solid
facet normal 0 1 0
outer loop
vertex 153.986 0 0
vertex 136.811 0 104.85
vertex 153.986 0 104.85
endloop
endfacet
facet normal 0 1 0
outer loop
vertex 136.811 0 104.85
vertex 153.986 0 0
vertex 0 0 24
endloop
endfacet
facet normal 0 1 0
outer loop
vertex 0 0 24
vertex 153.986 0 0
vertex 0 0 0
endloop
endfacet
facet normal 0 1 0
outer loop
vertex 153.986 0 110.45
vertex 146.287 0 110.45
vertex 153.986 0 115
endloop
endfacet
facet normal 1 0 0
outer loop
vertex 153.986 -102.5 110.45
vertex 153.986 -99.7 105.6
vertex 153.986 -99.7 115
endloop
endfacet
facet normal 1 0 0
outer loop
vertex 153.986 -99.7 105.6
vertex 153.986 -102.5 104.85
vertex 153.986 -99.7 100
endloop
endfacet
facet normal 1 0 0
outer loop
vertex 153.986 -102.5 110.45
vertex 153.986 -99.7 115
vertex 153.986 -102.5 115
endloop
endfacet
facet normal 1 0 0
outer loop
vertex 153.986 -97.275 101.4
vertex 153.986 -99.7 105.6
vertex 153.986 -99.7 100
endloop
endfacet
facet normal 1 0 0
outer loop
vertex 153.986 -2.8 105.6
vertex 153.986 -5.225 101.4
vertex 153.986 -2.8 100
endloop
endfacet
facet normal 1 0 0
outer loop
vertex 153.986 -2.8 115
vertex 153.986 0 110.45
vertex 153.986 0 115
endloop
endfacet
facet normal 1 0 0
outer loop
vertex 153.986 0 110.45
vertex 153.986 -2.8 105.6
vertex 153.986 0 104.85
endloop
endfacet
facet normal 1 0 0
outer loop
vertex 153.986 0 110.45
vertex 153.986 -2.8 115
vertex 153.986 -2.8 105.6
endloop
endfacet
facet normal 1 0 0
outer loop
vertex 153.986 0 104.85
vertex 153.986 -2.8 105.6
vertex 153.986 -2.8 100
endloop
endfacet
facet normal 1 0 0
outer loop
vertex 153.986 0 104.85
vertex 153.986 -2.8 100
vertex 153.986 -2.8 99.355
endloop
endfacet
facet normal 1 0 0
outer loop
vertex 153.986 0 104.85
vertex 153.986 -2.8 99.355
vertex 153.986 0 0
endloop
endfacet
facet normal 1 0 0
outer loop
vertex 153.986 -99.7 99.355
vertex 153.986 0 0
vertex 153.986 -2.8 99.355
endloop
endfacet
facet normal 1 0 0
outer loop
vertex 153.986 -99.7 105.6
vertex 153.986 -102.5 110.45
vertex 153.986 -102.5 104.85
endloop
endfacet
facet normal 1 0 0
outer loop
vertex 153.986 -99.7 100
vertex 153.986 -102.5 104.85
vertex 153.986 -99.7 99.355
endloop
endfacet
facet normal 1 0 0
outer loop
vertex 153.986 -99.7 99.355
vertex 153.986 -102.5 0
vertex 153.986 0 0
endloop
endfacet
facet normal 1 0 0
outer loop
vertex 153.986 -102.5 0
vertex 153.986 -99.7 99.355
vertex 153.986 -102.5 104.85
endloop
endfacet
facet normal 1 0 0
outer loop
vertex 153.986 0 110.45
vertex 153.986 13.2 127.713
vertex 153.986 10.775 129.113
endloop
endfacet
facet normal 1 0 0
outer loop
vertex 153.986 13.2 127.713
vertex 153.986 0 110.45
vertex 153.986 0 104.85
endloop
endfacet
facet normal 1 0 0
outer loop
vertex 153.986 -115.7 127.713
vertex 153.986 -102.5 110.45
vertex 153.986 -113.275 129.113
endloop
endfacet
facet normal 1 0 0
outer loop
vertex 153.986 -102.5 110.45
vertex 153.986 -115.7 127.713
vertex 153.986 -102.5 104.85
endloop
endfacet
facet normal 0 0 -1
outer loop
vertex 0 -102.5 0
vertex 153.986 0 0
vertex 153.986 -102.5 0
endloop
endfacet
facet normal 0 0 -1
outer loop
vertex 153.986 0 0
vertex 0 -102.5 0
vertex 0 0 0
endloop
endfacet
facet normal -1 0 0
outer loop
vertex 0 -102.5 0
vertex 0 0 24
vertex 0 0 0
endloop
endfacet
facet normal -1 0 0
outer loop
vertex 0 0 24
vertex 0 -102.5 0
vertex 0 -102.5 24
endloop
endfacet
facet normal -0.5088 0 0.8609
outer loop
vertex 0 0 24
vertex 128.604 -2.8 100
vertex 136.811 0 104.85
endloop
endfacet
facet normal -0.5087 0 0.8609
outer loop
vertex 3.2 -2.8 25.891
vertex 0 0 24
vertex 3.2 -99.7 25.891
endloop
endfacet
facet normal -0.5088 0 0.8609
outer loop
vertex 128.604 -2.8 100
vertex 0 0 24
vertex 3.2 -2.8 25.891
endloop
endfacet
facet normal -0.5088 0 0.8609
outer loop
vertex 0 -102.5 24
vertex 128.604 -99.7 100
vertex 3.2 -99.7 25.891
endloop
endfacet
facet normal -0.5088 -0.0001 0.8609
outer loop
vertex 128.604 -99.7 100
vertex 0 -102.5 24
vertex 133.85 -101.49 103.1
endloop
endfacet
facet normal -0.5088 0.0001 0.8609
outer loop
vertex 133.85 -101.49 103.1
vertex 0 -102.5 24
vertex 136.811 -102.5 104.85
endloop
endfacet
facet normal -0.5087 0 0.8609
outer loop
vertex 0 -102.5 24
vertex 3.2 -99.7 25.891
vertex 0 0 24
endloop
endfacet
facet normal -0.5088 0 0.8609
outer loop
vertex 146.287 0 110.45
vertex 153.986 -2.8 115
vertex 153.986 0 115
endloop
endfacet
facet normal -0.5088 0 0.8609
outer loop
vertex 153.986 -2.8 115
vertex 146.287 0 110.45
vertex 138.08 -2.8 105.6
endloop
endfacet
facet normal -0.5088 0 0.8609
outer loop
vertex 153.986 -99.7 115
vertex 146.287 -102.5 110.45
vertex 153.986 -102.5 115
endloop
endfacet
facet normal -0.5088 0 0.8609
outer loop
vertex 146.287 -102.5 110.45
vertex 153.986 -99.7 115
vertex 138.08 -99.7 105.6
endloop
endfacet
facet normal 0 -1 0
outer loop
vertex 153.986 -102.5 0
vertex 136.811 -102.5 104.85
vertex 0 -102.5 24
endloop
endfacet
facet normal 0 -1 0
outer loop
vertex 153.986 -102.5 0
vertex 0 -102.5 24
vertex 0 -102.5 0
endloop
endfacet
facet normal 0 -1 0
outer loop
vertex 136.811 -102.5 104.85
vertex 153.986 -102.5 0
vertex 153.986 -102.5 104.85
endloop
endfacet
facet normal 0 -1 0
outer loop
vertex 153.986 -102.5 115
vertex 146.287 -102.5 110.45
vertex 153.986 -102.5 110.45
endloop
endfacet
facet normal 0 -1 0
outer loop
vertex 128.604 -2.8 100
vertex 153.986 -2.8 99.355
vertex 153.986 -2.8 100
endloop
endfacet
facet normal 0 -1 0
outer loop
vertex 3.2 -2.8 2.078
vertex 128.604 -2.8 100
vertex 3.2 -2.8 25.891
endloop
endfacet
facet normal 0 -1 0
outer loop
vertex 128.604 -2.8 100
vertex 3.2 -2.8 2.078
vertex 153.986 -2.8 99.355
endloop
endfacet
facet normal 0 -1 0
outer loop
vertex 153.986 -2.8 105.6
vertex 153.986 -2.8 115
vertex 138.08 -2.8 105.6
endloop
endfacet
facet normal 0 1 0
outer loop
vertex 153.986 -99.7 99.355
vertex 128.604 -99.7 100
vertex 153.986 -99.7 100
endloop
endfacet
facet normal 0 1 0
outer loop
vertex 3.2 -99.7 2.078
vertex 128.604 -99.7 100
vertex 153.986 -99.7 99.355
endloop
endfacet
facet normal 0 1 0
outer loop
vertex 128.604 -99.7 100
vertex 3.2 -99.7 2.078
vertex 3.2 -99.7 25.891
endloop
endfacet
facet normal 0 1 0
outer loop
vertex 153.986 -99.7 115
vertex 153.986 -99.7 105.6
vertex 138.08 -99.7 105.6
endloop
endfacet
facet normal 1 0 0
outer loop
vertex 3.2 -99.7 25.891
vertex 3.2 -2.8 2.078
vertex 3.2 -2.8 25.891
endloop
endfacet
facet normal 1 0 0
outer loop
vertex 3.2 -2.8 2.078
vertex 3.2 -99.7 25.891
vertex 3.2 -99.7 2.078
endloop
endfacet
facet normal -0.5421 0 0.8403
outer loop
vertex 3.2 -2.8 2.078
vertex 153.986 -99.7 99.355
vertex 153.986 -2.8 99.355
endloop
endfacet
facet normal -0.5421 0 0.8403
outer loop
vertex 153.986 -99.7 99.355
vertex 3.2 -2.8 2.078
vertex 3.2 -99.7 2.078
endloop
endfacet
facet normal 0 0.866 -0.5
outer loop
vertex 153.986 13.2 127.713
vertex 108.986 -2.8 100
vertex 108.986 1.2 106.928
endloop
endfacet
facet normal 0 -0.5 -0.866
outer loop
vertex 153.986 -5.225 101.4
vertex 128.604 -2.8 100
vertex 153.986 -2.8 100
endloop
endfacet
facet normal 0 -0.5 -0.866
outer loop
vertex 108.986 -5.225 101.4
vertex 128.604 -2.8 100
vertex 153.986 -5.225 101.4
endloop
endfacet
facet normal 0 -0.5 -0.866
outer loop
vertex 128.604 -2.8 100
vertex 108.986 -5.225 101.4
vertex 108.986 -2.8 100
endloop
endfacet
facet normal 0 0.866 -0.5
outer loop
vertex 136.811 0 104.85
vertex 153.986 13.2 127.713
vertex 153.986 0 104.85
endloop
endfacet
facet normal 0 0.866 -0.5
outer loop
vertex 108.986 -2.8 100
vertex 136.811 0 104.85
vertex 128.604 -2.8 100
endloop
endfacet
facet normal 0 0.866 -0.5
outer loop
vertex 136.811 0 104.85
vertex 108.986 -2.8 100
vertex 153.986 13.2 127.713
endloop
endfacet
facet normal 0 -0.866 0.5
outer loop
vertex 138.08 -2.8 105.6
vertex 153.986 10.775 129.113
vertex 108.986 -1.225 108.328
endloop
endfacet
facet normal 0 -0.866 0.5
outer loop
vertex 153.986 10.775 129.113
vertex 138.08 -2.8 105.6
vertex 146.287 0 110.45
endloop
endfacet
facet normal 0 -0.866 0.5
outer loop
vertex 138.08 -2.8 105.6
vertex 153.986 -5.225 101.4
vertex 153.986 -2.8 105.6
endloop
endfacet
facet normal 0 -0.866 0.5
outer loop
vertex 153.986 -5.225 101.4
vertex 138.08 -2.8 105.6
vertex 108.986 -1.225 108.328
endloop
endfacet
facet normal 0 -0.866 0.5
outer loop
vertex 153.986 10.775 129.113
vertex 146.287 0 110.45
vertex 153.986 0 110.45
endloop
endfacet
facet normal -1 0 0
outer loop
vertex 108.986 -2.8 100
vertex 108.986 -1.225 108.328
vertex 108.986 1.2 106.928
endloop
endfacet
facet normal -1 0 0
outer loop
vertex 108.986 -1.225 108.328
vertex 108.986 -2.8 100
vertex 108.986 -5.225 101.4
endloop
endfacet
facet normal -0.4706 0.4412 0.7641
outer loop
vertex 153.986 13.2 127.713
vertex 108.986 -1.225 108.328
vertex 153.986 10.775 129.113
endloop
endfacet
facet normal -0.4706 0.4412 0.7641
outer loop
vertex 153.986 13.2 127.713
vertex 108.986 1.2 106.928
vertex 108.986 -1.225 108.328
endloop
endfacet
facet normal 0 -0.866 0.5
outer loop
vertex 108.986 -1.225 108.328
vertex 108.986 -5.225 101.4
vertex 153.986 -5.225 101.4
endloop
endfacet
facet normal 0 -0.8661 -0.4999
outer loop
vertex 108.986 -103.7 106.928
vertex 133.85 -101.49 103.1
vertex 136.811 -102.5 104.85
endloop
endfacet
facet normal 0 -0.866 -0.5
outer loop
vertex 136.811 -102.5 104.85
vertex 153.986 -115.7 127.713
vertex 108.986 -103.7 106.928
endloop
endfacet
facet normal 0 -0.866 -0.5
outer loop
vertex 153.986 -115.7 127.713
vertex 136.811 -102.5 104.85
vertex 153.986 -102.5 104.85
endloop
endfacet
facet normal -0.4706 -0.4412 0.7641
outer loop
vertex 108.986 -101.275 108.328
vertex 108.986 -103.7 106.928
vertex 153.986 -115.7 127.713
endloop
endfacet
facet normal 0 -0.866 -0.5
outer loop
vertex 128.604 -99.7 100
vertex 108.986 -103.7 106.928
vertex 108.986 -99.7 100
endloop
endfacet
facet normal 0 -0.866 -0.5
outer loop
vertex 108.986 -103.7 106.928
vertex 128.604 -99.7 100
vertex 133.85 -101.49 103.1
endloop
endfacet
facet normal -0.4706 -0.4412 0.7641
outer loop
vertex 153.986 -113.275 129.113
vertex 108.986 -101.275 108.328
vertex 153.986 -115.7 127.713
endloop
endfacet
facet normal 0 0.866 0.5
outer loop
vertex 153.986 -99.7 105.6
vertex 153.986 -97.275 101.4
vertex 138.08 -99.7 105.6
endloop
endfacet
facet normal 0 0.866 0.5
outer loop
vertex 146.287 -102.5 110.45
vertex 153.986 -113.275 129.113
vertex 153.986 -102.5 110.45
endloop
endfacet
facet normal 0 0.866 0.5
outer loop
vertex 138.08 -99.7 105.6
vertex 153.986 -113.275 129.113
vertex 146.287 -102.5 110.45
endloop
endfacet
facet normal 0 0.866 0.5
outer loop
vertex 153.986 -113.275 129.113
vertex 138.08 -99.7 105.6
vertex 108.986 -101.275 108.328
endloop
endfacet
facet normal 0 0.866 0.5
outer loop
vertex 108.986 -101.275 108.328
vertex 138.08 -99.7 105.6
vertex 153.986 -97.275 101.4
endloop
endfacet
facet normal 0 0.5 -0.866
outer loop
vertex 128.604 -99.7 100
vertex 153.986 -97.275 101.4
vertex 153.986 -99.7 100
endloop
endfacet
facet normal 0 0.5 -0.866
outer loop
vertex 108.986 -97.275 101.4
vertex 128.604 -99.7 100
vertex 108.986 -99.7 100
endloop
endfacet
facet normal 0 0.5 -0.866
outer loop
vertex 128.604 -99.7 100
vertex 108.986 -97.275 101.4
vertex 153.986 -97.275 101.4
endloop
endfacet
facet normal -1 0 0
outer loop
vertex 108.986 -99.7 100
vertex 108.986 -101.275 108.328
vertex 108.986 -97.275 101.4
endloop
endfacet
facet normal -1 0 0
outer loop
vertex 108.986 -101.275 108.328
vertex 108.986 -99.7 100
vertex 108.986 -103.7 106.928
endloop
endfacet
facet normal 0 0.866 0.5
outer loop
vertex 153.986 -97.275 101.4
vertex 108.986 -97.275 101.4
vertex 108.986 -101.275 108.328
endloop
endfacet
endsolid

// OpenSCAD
// ============================================================================
//  Lorebox — Elevated-Scanner Gravity Slide + Catch Bin  (Epson DS-575W)
//
//  For when the scanner is raised on a stand. Cards eject from the elevated
//  output slot, drop onto an inclined slide, and glide down into a stack
//  against a backstop — gravity decelerates them so they land flat and in
//  order instead of shooting across the desk and flipping.
//
//  PLACEMENT
//    - This part sits on the desk in FRONT of the scanner.
//    - Its high back edge reaches UP to just below the output slot.
//    - Set `drop_height` = how high the output slot sits above the desk
//      (= your stand lift + the slot's height above the scanner's own base).
//      Aim the slot so cards land on the slide a bit below its top edge.
//
//  THE STAND (build in wood/printed blocks/brackets — not modeled here)
//    - Just needs to hold the DS-575W level and stable at your chosen height.
//    - 80-130 mm of lift gives a nice slide without a huge footprint.
//    - Leave the front clear so cards fall straight onto the slide.
//    - Remember Epson's tip: push the scanner's output extension IN so cards
//      eject freely (straight path) rather than curling onto its own tray.
//
//  PRINTING
//    - Big footprint; print in halves along the width and glue/dovetail if it
//      exceeds your bed (split_print below cuts it in two mirrored halves).
//    - The slide surface should be SMOOTH: print that face up, or sand it, or
//      lay down packing tape / adhesive PTFE so cards glide.
//    - Line the backstop face with felt/foam to kill the last bit of bounce.
//    - PLA/PETG, 3 perimeters, 10-15% infill (carries no real load).
//
//  TUNING (mock in foam board first!)
//    - Cards stall on the slide      -> raise ramp_angle, or smooth the slide
//    - Cards arrive too fast / flip  -> lower ramp_angle toward 28
//    - Cards overshoot the backstop  -> raise backstop_h
//    - Cards don't land on the slide -> raise/lower the stand so the slot
//                                       aims onto the upper third of the slide
// ============================================================================

/* [Card] — DS-575W feeds long-edge-first, so the long edge spans the slide */
card_w     = 88.9;    // width across the slide (sleeved? add 2-3 mm)
side_clear = 4.0;     // gap each side of the card (rails) — bumped from 2.5
                      //   after real-world testing showed it ran a touch tight

/* [Geometry] */
drop_height = 100;    // output-slot height above the desk (= stand lift, ~)
ramp_angle  = 33;     // slide tilt from horizontal (28-36 is the sweet spot)
rail_h      = 15;     // rail height above the slide surface
backstop_h  = 24;     // front wall the stack leans against
backstop_th = 3.2;    // backstop thickness

/* [Structure] */
wall        = 2.8;    // side-rail thickness

/* [Funnel guide] — splayed wings at the top that steer off-center cards in */
flare       = true;   // false = plain rails, no funnel
flare_len   = 45;     // how far down the slide the wings reach (along depth)
flare_h     = 32;     // how tall the wings rise above the slide at the back
flare_angle = 30;     // outward splay from vertical (bigger = wider mouth)

/* [Printing] */
split_print = false;  // true = output two mirrored half-width pieces to glue
$fn = 56;

// ---- Derived -------------------------------------------------------------
inner_w = card_w + 2*side_clear;        // clear channel width
outer_w = inner_w + 2*wall;
L       = drop_height / tan(ramp_angle); // slide horizontal run (depth)

function slideZ(x) = x / L * drop_height; // slide surface height at depth x

module side_profile() {
    // x = depth (0 = front/backstop, L = back/high), y = height
    polygon([[0, 0], [L, 0], [L, drop_height + rail_h], [0, backstop_h]]);
}

module channel_profile() {
    big = drop_height + rail_h + 30;
    // Everything above the slide surface, from just behind the backstop to the
    // open back. Removing this leaves: solid wedge below, rails, front backstop.
    polygon([[backstop_th, slideZ(backstop_th)],
             [L + 1,       drop_height],
             [L + 1,       big],
             [backstop_th, big]]);
}

module wing() {
    // local: x = along depth, y = up, z = thickness. Low at the front of the
    // flare zone, full height at the back, so it blends into the rail.
    linear_extrude(height = wall)
        polygon([[0, 0], [flare_len, 0], [flare_len, flare_h], [0, flare_h * 0.25]]);
}

module wings() {
    // Left wing: rises from the back of the left rail, splayed outward (-z).
    translate([L - flare_len, drop_height, wall])
        rotate([-flare_angle, 0, 0]) wing();
    // Right wing: mirror of the left across the width centerline.
    translate([0, 0, outer_w]) mirror([0, 0, 1])
        translate([L - flare_len, drop_height, wall])
            rotate([-flare_angle, 0, 0]) wing();
}

module part() {
    union() {
        difference() {
            linear_extrude(height = outer_w) side_profile();
            translate([0, 0, wall])
                linear_extrude(height = inner_w) channel_profile();
        }
        if (flare) wings();
    }
}

// Stand height up so +Z is "up" when viewed.
module assembly() {
    if (split_print) {
        // two halves split along the width centerline, laid side by side.
        H = drop_height + flare_h + rail_h + 10;   // generous: clears wings
        rotate([90, 0, 0]) intersection() {
            part();
            translate([-5, -5, -flare_h]) cube([L + 10, H, outer_w/2 + flare_h]);
        }
        translate([0, outer_w/2 + 12, 0])
            rotate([90, 0, 0]) intersection() {
                part();
                translate([-5, -5, outer_w/2]) cube([L + 10, H, outer_w/2 + flare_h]);
            }
    } else {
        rotate([90, 0, 0]) part();
    }
}

assembly();

echo(str("Footprint: depth ", L, " mm  x  width ", outer_w, " mm"));
echo(str("Back (tall) edge height: ", drop_height + rail_h, " mm"));
echo(str("Set drop_height to your slot-above-desk height; current = ", drop_height));
